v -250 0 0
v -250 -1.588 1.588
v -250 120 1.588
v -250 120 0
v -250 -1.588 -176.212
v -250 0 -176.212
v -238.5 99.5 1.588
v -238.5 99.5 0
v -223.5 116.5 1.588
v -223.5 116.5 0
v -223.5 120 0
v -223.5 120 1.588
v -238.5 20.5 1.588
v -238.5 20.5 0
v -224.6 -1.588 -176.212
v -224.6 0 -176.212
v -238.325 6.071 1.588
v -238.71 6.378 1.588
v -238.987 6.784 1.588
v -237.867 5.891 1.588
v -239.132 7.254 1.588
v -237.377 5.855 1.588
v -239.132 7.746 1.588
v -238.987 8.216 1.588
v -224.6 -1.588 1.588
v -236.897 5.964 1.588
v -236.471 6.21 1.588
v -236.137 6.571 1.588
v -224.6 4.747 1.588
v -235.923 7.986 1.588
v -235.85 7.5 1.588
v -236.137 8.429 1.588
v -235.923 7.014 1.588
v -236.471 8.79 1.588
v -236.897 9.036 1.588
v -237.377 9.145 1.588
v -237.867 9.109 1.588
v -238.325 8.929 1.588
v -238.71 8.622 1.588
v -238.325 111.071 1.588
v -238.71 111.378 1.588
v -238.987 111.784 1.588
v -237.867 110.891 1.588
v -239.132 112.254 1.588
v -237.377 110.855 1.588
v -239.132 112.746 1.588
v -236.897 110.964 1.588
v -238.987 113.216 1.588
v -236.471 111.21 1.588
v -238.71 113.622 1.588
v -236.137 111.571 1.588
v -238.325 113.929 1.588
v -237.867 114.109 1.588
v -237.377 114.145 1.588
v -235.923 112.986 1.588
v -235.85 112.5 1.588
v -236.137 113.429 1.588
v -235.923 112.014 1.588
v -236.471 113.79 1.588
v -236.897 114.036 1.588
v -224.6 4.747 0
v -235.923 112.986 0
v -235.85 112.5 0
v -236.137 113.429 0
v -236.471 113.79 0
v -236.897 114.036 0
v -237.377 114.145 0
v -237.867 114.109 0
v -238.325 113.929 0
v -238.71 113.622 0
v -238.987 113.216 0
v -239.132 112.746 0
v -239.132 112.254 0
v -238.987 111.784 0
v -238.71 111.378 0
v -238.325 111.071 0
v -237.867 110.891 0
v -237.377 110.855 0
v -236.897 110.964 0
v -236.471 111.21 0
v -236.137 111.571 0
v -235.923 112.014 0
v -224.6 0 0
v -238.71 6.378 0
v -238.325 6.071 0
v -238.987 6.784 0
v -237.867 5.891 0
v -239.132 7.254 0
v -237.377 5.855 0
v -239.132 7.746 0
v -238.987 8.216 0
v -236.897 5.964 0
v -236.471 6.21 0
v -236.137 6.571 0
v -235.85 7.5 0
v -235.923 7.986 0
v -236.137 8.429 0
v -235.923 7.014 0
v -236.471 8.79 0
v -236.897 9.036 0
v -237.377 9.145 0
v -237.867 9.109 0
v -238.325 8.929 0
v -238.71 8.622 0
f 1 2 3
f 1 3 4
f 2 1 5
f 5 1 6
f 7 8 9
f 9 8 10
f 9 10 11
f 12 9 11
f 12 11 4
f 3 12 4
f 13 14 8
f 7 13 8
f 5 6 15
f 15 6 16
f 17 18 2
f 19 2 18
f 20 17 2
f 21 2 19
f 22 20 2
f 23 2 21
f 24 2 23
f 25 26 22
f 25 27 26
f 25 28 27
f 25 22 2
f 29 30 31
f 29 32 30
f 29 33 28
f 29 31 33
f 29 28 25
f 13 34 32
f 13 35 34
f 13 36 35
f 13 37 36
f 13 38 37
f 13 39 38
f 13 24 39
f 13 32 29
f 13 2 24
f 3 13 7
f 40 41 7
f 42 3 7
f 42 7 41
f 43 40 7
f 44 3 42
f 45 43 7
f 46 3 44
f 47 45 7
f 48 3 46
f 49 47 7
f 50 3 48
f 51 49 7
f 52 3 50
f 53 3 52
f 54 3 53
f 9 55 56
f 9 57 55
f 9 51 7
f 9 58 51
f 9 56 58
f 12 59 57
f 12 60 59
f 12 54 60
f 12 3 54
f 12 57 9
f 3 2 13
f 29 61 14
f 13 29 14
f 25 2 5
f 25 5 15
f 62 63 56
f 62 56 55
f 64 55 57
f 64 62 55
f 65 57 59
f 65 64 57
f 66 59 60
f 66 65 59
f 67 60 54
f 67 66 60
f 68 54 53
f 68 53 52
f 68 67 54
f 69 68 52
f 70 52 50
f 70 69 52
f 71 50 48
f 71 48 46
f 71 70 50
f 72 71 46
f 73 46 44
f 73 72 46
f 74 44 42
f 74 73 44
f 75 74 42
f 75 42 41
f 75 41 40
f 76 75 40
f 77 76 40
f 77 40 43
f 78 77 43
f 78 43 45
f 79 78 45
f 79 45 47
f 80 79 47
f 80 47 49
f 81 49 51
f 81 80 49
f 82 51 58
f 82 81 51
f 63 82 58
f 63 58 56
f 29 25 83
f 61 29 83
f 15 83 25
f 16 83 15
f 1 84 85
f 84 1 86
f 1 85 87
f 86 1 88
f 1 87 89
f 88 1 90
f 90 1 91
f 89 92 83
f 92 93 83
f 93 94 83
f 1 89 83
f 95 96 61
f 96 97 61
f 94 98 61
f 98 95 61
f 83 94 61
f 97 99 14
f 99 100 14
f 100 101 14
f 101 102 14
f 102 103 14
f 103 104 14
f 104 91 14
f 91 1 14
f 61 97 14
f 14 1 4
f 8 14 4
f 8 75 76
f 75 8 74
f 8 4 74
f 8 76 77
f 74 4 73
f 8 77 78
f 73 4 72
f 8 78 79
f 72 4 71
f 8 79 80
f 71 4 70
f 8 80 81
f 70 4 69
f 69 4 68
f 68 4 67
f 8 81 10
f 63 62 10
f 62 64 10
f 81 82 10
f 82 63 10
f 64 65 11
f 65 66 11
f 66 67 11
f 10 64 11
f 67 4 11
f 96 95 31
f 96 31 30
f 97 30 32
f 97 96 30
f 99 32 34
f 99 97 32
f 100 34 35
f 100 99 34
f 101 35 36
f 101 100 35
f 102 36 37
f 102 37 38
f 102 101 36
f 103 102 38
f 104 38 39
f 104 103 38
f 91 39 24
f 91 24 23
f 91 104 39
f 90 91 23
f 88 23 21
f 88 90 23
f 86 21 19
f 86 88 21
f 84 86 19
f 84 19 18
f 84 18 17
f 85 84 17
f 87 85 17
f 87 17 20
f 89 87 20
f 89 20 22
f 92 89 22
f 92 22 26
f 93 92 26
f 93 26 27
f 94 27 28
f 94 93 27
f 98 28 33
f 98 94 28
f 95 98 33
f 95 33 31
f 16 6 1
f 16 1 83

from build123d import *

# Parameters (mm, degrees)
SKETCH1_R           = 1.65
BOSS_EXTRUDE1_DEPTH = 1.5875
SKETCH2_W           = 25.4
SKETCH2_H           = 177.8
BOSS_EXTRUDE2_DEPTH = 1.5875


with BuildPart() as part:
    # Sketch1 → Boss-Extrude1 (new body)
    with BuildSketch(Plane.XY):
        Polygon((-223.5, 120), (-250, 120), (-250, 0), (-224.6, 0), (-224.6, 4.746666667), (-238.5, 20.5), (-238.5, 99.5), (-223.5, 116.5), align=None)
        with Locations((-237.5, 7.5)):
            Circle(SKETCH1_R, mode=Mode.SUBTRACT)
        with Locations((-237.5, 112.5)):
            Circle(SKETCH1_R, mode=Mode.SUBTRACT)
    extrude(amount=BOSS_EXTRUDE1_DEPTH)

    # Sketch2 → Boss-Extrude2 (add)
    with BuildSketch(Plane(origin=(0, 0, 0), x_dir=(1, 0, 0), z_dir=(0, 1, 0))):
        with Locations((-237.3, 87.3125)):
            Rectangle(SKETCH2_W, SKETCH2_H)
    extrude(amount=-BOSS_EXTRUDE2_DEPTH)


solid = part.part
